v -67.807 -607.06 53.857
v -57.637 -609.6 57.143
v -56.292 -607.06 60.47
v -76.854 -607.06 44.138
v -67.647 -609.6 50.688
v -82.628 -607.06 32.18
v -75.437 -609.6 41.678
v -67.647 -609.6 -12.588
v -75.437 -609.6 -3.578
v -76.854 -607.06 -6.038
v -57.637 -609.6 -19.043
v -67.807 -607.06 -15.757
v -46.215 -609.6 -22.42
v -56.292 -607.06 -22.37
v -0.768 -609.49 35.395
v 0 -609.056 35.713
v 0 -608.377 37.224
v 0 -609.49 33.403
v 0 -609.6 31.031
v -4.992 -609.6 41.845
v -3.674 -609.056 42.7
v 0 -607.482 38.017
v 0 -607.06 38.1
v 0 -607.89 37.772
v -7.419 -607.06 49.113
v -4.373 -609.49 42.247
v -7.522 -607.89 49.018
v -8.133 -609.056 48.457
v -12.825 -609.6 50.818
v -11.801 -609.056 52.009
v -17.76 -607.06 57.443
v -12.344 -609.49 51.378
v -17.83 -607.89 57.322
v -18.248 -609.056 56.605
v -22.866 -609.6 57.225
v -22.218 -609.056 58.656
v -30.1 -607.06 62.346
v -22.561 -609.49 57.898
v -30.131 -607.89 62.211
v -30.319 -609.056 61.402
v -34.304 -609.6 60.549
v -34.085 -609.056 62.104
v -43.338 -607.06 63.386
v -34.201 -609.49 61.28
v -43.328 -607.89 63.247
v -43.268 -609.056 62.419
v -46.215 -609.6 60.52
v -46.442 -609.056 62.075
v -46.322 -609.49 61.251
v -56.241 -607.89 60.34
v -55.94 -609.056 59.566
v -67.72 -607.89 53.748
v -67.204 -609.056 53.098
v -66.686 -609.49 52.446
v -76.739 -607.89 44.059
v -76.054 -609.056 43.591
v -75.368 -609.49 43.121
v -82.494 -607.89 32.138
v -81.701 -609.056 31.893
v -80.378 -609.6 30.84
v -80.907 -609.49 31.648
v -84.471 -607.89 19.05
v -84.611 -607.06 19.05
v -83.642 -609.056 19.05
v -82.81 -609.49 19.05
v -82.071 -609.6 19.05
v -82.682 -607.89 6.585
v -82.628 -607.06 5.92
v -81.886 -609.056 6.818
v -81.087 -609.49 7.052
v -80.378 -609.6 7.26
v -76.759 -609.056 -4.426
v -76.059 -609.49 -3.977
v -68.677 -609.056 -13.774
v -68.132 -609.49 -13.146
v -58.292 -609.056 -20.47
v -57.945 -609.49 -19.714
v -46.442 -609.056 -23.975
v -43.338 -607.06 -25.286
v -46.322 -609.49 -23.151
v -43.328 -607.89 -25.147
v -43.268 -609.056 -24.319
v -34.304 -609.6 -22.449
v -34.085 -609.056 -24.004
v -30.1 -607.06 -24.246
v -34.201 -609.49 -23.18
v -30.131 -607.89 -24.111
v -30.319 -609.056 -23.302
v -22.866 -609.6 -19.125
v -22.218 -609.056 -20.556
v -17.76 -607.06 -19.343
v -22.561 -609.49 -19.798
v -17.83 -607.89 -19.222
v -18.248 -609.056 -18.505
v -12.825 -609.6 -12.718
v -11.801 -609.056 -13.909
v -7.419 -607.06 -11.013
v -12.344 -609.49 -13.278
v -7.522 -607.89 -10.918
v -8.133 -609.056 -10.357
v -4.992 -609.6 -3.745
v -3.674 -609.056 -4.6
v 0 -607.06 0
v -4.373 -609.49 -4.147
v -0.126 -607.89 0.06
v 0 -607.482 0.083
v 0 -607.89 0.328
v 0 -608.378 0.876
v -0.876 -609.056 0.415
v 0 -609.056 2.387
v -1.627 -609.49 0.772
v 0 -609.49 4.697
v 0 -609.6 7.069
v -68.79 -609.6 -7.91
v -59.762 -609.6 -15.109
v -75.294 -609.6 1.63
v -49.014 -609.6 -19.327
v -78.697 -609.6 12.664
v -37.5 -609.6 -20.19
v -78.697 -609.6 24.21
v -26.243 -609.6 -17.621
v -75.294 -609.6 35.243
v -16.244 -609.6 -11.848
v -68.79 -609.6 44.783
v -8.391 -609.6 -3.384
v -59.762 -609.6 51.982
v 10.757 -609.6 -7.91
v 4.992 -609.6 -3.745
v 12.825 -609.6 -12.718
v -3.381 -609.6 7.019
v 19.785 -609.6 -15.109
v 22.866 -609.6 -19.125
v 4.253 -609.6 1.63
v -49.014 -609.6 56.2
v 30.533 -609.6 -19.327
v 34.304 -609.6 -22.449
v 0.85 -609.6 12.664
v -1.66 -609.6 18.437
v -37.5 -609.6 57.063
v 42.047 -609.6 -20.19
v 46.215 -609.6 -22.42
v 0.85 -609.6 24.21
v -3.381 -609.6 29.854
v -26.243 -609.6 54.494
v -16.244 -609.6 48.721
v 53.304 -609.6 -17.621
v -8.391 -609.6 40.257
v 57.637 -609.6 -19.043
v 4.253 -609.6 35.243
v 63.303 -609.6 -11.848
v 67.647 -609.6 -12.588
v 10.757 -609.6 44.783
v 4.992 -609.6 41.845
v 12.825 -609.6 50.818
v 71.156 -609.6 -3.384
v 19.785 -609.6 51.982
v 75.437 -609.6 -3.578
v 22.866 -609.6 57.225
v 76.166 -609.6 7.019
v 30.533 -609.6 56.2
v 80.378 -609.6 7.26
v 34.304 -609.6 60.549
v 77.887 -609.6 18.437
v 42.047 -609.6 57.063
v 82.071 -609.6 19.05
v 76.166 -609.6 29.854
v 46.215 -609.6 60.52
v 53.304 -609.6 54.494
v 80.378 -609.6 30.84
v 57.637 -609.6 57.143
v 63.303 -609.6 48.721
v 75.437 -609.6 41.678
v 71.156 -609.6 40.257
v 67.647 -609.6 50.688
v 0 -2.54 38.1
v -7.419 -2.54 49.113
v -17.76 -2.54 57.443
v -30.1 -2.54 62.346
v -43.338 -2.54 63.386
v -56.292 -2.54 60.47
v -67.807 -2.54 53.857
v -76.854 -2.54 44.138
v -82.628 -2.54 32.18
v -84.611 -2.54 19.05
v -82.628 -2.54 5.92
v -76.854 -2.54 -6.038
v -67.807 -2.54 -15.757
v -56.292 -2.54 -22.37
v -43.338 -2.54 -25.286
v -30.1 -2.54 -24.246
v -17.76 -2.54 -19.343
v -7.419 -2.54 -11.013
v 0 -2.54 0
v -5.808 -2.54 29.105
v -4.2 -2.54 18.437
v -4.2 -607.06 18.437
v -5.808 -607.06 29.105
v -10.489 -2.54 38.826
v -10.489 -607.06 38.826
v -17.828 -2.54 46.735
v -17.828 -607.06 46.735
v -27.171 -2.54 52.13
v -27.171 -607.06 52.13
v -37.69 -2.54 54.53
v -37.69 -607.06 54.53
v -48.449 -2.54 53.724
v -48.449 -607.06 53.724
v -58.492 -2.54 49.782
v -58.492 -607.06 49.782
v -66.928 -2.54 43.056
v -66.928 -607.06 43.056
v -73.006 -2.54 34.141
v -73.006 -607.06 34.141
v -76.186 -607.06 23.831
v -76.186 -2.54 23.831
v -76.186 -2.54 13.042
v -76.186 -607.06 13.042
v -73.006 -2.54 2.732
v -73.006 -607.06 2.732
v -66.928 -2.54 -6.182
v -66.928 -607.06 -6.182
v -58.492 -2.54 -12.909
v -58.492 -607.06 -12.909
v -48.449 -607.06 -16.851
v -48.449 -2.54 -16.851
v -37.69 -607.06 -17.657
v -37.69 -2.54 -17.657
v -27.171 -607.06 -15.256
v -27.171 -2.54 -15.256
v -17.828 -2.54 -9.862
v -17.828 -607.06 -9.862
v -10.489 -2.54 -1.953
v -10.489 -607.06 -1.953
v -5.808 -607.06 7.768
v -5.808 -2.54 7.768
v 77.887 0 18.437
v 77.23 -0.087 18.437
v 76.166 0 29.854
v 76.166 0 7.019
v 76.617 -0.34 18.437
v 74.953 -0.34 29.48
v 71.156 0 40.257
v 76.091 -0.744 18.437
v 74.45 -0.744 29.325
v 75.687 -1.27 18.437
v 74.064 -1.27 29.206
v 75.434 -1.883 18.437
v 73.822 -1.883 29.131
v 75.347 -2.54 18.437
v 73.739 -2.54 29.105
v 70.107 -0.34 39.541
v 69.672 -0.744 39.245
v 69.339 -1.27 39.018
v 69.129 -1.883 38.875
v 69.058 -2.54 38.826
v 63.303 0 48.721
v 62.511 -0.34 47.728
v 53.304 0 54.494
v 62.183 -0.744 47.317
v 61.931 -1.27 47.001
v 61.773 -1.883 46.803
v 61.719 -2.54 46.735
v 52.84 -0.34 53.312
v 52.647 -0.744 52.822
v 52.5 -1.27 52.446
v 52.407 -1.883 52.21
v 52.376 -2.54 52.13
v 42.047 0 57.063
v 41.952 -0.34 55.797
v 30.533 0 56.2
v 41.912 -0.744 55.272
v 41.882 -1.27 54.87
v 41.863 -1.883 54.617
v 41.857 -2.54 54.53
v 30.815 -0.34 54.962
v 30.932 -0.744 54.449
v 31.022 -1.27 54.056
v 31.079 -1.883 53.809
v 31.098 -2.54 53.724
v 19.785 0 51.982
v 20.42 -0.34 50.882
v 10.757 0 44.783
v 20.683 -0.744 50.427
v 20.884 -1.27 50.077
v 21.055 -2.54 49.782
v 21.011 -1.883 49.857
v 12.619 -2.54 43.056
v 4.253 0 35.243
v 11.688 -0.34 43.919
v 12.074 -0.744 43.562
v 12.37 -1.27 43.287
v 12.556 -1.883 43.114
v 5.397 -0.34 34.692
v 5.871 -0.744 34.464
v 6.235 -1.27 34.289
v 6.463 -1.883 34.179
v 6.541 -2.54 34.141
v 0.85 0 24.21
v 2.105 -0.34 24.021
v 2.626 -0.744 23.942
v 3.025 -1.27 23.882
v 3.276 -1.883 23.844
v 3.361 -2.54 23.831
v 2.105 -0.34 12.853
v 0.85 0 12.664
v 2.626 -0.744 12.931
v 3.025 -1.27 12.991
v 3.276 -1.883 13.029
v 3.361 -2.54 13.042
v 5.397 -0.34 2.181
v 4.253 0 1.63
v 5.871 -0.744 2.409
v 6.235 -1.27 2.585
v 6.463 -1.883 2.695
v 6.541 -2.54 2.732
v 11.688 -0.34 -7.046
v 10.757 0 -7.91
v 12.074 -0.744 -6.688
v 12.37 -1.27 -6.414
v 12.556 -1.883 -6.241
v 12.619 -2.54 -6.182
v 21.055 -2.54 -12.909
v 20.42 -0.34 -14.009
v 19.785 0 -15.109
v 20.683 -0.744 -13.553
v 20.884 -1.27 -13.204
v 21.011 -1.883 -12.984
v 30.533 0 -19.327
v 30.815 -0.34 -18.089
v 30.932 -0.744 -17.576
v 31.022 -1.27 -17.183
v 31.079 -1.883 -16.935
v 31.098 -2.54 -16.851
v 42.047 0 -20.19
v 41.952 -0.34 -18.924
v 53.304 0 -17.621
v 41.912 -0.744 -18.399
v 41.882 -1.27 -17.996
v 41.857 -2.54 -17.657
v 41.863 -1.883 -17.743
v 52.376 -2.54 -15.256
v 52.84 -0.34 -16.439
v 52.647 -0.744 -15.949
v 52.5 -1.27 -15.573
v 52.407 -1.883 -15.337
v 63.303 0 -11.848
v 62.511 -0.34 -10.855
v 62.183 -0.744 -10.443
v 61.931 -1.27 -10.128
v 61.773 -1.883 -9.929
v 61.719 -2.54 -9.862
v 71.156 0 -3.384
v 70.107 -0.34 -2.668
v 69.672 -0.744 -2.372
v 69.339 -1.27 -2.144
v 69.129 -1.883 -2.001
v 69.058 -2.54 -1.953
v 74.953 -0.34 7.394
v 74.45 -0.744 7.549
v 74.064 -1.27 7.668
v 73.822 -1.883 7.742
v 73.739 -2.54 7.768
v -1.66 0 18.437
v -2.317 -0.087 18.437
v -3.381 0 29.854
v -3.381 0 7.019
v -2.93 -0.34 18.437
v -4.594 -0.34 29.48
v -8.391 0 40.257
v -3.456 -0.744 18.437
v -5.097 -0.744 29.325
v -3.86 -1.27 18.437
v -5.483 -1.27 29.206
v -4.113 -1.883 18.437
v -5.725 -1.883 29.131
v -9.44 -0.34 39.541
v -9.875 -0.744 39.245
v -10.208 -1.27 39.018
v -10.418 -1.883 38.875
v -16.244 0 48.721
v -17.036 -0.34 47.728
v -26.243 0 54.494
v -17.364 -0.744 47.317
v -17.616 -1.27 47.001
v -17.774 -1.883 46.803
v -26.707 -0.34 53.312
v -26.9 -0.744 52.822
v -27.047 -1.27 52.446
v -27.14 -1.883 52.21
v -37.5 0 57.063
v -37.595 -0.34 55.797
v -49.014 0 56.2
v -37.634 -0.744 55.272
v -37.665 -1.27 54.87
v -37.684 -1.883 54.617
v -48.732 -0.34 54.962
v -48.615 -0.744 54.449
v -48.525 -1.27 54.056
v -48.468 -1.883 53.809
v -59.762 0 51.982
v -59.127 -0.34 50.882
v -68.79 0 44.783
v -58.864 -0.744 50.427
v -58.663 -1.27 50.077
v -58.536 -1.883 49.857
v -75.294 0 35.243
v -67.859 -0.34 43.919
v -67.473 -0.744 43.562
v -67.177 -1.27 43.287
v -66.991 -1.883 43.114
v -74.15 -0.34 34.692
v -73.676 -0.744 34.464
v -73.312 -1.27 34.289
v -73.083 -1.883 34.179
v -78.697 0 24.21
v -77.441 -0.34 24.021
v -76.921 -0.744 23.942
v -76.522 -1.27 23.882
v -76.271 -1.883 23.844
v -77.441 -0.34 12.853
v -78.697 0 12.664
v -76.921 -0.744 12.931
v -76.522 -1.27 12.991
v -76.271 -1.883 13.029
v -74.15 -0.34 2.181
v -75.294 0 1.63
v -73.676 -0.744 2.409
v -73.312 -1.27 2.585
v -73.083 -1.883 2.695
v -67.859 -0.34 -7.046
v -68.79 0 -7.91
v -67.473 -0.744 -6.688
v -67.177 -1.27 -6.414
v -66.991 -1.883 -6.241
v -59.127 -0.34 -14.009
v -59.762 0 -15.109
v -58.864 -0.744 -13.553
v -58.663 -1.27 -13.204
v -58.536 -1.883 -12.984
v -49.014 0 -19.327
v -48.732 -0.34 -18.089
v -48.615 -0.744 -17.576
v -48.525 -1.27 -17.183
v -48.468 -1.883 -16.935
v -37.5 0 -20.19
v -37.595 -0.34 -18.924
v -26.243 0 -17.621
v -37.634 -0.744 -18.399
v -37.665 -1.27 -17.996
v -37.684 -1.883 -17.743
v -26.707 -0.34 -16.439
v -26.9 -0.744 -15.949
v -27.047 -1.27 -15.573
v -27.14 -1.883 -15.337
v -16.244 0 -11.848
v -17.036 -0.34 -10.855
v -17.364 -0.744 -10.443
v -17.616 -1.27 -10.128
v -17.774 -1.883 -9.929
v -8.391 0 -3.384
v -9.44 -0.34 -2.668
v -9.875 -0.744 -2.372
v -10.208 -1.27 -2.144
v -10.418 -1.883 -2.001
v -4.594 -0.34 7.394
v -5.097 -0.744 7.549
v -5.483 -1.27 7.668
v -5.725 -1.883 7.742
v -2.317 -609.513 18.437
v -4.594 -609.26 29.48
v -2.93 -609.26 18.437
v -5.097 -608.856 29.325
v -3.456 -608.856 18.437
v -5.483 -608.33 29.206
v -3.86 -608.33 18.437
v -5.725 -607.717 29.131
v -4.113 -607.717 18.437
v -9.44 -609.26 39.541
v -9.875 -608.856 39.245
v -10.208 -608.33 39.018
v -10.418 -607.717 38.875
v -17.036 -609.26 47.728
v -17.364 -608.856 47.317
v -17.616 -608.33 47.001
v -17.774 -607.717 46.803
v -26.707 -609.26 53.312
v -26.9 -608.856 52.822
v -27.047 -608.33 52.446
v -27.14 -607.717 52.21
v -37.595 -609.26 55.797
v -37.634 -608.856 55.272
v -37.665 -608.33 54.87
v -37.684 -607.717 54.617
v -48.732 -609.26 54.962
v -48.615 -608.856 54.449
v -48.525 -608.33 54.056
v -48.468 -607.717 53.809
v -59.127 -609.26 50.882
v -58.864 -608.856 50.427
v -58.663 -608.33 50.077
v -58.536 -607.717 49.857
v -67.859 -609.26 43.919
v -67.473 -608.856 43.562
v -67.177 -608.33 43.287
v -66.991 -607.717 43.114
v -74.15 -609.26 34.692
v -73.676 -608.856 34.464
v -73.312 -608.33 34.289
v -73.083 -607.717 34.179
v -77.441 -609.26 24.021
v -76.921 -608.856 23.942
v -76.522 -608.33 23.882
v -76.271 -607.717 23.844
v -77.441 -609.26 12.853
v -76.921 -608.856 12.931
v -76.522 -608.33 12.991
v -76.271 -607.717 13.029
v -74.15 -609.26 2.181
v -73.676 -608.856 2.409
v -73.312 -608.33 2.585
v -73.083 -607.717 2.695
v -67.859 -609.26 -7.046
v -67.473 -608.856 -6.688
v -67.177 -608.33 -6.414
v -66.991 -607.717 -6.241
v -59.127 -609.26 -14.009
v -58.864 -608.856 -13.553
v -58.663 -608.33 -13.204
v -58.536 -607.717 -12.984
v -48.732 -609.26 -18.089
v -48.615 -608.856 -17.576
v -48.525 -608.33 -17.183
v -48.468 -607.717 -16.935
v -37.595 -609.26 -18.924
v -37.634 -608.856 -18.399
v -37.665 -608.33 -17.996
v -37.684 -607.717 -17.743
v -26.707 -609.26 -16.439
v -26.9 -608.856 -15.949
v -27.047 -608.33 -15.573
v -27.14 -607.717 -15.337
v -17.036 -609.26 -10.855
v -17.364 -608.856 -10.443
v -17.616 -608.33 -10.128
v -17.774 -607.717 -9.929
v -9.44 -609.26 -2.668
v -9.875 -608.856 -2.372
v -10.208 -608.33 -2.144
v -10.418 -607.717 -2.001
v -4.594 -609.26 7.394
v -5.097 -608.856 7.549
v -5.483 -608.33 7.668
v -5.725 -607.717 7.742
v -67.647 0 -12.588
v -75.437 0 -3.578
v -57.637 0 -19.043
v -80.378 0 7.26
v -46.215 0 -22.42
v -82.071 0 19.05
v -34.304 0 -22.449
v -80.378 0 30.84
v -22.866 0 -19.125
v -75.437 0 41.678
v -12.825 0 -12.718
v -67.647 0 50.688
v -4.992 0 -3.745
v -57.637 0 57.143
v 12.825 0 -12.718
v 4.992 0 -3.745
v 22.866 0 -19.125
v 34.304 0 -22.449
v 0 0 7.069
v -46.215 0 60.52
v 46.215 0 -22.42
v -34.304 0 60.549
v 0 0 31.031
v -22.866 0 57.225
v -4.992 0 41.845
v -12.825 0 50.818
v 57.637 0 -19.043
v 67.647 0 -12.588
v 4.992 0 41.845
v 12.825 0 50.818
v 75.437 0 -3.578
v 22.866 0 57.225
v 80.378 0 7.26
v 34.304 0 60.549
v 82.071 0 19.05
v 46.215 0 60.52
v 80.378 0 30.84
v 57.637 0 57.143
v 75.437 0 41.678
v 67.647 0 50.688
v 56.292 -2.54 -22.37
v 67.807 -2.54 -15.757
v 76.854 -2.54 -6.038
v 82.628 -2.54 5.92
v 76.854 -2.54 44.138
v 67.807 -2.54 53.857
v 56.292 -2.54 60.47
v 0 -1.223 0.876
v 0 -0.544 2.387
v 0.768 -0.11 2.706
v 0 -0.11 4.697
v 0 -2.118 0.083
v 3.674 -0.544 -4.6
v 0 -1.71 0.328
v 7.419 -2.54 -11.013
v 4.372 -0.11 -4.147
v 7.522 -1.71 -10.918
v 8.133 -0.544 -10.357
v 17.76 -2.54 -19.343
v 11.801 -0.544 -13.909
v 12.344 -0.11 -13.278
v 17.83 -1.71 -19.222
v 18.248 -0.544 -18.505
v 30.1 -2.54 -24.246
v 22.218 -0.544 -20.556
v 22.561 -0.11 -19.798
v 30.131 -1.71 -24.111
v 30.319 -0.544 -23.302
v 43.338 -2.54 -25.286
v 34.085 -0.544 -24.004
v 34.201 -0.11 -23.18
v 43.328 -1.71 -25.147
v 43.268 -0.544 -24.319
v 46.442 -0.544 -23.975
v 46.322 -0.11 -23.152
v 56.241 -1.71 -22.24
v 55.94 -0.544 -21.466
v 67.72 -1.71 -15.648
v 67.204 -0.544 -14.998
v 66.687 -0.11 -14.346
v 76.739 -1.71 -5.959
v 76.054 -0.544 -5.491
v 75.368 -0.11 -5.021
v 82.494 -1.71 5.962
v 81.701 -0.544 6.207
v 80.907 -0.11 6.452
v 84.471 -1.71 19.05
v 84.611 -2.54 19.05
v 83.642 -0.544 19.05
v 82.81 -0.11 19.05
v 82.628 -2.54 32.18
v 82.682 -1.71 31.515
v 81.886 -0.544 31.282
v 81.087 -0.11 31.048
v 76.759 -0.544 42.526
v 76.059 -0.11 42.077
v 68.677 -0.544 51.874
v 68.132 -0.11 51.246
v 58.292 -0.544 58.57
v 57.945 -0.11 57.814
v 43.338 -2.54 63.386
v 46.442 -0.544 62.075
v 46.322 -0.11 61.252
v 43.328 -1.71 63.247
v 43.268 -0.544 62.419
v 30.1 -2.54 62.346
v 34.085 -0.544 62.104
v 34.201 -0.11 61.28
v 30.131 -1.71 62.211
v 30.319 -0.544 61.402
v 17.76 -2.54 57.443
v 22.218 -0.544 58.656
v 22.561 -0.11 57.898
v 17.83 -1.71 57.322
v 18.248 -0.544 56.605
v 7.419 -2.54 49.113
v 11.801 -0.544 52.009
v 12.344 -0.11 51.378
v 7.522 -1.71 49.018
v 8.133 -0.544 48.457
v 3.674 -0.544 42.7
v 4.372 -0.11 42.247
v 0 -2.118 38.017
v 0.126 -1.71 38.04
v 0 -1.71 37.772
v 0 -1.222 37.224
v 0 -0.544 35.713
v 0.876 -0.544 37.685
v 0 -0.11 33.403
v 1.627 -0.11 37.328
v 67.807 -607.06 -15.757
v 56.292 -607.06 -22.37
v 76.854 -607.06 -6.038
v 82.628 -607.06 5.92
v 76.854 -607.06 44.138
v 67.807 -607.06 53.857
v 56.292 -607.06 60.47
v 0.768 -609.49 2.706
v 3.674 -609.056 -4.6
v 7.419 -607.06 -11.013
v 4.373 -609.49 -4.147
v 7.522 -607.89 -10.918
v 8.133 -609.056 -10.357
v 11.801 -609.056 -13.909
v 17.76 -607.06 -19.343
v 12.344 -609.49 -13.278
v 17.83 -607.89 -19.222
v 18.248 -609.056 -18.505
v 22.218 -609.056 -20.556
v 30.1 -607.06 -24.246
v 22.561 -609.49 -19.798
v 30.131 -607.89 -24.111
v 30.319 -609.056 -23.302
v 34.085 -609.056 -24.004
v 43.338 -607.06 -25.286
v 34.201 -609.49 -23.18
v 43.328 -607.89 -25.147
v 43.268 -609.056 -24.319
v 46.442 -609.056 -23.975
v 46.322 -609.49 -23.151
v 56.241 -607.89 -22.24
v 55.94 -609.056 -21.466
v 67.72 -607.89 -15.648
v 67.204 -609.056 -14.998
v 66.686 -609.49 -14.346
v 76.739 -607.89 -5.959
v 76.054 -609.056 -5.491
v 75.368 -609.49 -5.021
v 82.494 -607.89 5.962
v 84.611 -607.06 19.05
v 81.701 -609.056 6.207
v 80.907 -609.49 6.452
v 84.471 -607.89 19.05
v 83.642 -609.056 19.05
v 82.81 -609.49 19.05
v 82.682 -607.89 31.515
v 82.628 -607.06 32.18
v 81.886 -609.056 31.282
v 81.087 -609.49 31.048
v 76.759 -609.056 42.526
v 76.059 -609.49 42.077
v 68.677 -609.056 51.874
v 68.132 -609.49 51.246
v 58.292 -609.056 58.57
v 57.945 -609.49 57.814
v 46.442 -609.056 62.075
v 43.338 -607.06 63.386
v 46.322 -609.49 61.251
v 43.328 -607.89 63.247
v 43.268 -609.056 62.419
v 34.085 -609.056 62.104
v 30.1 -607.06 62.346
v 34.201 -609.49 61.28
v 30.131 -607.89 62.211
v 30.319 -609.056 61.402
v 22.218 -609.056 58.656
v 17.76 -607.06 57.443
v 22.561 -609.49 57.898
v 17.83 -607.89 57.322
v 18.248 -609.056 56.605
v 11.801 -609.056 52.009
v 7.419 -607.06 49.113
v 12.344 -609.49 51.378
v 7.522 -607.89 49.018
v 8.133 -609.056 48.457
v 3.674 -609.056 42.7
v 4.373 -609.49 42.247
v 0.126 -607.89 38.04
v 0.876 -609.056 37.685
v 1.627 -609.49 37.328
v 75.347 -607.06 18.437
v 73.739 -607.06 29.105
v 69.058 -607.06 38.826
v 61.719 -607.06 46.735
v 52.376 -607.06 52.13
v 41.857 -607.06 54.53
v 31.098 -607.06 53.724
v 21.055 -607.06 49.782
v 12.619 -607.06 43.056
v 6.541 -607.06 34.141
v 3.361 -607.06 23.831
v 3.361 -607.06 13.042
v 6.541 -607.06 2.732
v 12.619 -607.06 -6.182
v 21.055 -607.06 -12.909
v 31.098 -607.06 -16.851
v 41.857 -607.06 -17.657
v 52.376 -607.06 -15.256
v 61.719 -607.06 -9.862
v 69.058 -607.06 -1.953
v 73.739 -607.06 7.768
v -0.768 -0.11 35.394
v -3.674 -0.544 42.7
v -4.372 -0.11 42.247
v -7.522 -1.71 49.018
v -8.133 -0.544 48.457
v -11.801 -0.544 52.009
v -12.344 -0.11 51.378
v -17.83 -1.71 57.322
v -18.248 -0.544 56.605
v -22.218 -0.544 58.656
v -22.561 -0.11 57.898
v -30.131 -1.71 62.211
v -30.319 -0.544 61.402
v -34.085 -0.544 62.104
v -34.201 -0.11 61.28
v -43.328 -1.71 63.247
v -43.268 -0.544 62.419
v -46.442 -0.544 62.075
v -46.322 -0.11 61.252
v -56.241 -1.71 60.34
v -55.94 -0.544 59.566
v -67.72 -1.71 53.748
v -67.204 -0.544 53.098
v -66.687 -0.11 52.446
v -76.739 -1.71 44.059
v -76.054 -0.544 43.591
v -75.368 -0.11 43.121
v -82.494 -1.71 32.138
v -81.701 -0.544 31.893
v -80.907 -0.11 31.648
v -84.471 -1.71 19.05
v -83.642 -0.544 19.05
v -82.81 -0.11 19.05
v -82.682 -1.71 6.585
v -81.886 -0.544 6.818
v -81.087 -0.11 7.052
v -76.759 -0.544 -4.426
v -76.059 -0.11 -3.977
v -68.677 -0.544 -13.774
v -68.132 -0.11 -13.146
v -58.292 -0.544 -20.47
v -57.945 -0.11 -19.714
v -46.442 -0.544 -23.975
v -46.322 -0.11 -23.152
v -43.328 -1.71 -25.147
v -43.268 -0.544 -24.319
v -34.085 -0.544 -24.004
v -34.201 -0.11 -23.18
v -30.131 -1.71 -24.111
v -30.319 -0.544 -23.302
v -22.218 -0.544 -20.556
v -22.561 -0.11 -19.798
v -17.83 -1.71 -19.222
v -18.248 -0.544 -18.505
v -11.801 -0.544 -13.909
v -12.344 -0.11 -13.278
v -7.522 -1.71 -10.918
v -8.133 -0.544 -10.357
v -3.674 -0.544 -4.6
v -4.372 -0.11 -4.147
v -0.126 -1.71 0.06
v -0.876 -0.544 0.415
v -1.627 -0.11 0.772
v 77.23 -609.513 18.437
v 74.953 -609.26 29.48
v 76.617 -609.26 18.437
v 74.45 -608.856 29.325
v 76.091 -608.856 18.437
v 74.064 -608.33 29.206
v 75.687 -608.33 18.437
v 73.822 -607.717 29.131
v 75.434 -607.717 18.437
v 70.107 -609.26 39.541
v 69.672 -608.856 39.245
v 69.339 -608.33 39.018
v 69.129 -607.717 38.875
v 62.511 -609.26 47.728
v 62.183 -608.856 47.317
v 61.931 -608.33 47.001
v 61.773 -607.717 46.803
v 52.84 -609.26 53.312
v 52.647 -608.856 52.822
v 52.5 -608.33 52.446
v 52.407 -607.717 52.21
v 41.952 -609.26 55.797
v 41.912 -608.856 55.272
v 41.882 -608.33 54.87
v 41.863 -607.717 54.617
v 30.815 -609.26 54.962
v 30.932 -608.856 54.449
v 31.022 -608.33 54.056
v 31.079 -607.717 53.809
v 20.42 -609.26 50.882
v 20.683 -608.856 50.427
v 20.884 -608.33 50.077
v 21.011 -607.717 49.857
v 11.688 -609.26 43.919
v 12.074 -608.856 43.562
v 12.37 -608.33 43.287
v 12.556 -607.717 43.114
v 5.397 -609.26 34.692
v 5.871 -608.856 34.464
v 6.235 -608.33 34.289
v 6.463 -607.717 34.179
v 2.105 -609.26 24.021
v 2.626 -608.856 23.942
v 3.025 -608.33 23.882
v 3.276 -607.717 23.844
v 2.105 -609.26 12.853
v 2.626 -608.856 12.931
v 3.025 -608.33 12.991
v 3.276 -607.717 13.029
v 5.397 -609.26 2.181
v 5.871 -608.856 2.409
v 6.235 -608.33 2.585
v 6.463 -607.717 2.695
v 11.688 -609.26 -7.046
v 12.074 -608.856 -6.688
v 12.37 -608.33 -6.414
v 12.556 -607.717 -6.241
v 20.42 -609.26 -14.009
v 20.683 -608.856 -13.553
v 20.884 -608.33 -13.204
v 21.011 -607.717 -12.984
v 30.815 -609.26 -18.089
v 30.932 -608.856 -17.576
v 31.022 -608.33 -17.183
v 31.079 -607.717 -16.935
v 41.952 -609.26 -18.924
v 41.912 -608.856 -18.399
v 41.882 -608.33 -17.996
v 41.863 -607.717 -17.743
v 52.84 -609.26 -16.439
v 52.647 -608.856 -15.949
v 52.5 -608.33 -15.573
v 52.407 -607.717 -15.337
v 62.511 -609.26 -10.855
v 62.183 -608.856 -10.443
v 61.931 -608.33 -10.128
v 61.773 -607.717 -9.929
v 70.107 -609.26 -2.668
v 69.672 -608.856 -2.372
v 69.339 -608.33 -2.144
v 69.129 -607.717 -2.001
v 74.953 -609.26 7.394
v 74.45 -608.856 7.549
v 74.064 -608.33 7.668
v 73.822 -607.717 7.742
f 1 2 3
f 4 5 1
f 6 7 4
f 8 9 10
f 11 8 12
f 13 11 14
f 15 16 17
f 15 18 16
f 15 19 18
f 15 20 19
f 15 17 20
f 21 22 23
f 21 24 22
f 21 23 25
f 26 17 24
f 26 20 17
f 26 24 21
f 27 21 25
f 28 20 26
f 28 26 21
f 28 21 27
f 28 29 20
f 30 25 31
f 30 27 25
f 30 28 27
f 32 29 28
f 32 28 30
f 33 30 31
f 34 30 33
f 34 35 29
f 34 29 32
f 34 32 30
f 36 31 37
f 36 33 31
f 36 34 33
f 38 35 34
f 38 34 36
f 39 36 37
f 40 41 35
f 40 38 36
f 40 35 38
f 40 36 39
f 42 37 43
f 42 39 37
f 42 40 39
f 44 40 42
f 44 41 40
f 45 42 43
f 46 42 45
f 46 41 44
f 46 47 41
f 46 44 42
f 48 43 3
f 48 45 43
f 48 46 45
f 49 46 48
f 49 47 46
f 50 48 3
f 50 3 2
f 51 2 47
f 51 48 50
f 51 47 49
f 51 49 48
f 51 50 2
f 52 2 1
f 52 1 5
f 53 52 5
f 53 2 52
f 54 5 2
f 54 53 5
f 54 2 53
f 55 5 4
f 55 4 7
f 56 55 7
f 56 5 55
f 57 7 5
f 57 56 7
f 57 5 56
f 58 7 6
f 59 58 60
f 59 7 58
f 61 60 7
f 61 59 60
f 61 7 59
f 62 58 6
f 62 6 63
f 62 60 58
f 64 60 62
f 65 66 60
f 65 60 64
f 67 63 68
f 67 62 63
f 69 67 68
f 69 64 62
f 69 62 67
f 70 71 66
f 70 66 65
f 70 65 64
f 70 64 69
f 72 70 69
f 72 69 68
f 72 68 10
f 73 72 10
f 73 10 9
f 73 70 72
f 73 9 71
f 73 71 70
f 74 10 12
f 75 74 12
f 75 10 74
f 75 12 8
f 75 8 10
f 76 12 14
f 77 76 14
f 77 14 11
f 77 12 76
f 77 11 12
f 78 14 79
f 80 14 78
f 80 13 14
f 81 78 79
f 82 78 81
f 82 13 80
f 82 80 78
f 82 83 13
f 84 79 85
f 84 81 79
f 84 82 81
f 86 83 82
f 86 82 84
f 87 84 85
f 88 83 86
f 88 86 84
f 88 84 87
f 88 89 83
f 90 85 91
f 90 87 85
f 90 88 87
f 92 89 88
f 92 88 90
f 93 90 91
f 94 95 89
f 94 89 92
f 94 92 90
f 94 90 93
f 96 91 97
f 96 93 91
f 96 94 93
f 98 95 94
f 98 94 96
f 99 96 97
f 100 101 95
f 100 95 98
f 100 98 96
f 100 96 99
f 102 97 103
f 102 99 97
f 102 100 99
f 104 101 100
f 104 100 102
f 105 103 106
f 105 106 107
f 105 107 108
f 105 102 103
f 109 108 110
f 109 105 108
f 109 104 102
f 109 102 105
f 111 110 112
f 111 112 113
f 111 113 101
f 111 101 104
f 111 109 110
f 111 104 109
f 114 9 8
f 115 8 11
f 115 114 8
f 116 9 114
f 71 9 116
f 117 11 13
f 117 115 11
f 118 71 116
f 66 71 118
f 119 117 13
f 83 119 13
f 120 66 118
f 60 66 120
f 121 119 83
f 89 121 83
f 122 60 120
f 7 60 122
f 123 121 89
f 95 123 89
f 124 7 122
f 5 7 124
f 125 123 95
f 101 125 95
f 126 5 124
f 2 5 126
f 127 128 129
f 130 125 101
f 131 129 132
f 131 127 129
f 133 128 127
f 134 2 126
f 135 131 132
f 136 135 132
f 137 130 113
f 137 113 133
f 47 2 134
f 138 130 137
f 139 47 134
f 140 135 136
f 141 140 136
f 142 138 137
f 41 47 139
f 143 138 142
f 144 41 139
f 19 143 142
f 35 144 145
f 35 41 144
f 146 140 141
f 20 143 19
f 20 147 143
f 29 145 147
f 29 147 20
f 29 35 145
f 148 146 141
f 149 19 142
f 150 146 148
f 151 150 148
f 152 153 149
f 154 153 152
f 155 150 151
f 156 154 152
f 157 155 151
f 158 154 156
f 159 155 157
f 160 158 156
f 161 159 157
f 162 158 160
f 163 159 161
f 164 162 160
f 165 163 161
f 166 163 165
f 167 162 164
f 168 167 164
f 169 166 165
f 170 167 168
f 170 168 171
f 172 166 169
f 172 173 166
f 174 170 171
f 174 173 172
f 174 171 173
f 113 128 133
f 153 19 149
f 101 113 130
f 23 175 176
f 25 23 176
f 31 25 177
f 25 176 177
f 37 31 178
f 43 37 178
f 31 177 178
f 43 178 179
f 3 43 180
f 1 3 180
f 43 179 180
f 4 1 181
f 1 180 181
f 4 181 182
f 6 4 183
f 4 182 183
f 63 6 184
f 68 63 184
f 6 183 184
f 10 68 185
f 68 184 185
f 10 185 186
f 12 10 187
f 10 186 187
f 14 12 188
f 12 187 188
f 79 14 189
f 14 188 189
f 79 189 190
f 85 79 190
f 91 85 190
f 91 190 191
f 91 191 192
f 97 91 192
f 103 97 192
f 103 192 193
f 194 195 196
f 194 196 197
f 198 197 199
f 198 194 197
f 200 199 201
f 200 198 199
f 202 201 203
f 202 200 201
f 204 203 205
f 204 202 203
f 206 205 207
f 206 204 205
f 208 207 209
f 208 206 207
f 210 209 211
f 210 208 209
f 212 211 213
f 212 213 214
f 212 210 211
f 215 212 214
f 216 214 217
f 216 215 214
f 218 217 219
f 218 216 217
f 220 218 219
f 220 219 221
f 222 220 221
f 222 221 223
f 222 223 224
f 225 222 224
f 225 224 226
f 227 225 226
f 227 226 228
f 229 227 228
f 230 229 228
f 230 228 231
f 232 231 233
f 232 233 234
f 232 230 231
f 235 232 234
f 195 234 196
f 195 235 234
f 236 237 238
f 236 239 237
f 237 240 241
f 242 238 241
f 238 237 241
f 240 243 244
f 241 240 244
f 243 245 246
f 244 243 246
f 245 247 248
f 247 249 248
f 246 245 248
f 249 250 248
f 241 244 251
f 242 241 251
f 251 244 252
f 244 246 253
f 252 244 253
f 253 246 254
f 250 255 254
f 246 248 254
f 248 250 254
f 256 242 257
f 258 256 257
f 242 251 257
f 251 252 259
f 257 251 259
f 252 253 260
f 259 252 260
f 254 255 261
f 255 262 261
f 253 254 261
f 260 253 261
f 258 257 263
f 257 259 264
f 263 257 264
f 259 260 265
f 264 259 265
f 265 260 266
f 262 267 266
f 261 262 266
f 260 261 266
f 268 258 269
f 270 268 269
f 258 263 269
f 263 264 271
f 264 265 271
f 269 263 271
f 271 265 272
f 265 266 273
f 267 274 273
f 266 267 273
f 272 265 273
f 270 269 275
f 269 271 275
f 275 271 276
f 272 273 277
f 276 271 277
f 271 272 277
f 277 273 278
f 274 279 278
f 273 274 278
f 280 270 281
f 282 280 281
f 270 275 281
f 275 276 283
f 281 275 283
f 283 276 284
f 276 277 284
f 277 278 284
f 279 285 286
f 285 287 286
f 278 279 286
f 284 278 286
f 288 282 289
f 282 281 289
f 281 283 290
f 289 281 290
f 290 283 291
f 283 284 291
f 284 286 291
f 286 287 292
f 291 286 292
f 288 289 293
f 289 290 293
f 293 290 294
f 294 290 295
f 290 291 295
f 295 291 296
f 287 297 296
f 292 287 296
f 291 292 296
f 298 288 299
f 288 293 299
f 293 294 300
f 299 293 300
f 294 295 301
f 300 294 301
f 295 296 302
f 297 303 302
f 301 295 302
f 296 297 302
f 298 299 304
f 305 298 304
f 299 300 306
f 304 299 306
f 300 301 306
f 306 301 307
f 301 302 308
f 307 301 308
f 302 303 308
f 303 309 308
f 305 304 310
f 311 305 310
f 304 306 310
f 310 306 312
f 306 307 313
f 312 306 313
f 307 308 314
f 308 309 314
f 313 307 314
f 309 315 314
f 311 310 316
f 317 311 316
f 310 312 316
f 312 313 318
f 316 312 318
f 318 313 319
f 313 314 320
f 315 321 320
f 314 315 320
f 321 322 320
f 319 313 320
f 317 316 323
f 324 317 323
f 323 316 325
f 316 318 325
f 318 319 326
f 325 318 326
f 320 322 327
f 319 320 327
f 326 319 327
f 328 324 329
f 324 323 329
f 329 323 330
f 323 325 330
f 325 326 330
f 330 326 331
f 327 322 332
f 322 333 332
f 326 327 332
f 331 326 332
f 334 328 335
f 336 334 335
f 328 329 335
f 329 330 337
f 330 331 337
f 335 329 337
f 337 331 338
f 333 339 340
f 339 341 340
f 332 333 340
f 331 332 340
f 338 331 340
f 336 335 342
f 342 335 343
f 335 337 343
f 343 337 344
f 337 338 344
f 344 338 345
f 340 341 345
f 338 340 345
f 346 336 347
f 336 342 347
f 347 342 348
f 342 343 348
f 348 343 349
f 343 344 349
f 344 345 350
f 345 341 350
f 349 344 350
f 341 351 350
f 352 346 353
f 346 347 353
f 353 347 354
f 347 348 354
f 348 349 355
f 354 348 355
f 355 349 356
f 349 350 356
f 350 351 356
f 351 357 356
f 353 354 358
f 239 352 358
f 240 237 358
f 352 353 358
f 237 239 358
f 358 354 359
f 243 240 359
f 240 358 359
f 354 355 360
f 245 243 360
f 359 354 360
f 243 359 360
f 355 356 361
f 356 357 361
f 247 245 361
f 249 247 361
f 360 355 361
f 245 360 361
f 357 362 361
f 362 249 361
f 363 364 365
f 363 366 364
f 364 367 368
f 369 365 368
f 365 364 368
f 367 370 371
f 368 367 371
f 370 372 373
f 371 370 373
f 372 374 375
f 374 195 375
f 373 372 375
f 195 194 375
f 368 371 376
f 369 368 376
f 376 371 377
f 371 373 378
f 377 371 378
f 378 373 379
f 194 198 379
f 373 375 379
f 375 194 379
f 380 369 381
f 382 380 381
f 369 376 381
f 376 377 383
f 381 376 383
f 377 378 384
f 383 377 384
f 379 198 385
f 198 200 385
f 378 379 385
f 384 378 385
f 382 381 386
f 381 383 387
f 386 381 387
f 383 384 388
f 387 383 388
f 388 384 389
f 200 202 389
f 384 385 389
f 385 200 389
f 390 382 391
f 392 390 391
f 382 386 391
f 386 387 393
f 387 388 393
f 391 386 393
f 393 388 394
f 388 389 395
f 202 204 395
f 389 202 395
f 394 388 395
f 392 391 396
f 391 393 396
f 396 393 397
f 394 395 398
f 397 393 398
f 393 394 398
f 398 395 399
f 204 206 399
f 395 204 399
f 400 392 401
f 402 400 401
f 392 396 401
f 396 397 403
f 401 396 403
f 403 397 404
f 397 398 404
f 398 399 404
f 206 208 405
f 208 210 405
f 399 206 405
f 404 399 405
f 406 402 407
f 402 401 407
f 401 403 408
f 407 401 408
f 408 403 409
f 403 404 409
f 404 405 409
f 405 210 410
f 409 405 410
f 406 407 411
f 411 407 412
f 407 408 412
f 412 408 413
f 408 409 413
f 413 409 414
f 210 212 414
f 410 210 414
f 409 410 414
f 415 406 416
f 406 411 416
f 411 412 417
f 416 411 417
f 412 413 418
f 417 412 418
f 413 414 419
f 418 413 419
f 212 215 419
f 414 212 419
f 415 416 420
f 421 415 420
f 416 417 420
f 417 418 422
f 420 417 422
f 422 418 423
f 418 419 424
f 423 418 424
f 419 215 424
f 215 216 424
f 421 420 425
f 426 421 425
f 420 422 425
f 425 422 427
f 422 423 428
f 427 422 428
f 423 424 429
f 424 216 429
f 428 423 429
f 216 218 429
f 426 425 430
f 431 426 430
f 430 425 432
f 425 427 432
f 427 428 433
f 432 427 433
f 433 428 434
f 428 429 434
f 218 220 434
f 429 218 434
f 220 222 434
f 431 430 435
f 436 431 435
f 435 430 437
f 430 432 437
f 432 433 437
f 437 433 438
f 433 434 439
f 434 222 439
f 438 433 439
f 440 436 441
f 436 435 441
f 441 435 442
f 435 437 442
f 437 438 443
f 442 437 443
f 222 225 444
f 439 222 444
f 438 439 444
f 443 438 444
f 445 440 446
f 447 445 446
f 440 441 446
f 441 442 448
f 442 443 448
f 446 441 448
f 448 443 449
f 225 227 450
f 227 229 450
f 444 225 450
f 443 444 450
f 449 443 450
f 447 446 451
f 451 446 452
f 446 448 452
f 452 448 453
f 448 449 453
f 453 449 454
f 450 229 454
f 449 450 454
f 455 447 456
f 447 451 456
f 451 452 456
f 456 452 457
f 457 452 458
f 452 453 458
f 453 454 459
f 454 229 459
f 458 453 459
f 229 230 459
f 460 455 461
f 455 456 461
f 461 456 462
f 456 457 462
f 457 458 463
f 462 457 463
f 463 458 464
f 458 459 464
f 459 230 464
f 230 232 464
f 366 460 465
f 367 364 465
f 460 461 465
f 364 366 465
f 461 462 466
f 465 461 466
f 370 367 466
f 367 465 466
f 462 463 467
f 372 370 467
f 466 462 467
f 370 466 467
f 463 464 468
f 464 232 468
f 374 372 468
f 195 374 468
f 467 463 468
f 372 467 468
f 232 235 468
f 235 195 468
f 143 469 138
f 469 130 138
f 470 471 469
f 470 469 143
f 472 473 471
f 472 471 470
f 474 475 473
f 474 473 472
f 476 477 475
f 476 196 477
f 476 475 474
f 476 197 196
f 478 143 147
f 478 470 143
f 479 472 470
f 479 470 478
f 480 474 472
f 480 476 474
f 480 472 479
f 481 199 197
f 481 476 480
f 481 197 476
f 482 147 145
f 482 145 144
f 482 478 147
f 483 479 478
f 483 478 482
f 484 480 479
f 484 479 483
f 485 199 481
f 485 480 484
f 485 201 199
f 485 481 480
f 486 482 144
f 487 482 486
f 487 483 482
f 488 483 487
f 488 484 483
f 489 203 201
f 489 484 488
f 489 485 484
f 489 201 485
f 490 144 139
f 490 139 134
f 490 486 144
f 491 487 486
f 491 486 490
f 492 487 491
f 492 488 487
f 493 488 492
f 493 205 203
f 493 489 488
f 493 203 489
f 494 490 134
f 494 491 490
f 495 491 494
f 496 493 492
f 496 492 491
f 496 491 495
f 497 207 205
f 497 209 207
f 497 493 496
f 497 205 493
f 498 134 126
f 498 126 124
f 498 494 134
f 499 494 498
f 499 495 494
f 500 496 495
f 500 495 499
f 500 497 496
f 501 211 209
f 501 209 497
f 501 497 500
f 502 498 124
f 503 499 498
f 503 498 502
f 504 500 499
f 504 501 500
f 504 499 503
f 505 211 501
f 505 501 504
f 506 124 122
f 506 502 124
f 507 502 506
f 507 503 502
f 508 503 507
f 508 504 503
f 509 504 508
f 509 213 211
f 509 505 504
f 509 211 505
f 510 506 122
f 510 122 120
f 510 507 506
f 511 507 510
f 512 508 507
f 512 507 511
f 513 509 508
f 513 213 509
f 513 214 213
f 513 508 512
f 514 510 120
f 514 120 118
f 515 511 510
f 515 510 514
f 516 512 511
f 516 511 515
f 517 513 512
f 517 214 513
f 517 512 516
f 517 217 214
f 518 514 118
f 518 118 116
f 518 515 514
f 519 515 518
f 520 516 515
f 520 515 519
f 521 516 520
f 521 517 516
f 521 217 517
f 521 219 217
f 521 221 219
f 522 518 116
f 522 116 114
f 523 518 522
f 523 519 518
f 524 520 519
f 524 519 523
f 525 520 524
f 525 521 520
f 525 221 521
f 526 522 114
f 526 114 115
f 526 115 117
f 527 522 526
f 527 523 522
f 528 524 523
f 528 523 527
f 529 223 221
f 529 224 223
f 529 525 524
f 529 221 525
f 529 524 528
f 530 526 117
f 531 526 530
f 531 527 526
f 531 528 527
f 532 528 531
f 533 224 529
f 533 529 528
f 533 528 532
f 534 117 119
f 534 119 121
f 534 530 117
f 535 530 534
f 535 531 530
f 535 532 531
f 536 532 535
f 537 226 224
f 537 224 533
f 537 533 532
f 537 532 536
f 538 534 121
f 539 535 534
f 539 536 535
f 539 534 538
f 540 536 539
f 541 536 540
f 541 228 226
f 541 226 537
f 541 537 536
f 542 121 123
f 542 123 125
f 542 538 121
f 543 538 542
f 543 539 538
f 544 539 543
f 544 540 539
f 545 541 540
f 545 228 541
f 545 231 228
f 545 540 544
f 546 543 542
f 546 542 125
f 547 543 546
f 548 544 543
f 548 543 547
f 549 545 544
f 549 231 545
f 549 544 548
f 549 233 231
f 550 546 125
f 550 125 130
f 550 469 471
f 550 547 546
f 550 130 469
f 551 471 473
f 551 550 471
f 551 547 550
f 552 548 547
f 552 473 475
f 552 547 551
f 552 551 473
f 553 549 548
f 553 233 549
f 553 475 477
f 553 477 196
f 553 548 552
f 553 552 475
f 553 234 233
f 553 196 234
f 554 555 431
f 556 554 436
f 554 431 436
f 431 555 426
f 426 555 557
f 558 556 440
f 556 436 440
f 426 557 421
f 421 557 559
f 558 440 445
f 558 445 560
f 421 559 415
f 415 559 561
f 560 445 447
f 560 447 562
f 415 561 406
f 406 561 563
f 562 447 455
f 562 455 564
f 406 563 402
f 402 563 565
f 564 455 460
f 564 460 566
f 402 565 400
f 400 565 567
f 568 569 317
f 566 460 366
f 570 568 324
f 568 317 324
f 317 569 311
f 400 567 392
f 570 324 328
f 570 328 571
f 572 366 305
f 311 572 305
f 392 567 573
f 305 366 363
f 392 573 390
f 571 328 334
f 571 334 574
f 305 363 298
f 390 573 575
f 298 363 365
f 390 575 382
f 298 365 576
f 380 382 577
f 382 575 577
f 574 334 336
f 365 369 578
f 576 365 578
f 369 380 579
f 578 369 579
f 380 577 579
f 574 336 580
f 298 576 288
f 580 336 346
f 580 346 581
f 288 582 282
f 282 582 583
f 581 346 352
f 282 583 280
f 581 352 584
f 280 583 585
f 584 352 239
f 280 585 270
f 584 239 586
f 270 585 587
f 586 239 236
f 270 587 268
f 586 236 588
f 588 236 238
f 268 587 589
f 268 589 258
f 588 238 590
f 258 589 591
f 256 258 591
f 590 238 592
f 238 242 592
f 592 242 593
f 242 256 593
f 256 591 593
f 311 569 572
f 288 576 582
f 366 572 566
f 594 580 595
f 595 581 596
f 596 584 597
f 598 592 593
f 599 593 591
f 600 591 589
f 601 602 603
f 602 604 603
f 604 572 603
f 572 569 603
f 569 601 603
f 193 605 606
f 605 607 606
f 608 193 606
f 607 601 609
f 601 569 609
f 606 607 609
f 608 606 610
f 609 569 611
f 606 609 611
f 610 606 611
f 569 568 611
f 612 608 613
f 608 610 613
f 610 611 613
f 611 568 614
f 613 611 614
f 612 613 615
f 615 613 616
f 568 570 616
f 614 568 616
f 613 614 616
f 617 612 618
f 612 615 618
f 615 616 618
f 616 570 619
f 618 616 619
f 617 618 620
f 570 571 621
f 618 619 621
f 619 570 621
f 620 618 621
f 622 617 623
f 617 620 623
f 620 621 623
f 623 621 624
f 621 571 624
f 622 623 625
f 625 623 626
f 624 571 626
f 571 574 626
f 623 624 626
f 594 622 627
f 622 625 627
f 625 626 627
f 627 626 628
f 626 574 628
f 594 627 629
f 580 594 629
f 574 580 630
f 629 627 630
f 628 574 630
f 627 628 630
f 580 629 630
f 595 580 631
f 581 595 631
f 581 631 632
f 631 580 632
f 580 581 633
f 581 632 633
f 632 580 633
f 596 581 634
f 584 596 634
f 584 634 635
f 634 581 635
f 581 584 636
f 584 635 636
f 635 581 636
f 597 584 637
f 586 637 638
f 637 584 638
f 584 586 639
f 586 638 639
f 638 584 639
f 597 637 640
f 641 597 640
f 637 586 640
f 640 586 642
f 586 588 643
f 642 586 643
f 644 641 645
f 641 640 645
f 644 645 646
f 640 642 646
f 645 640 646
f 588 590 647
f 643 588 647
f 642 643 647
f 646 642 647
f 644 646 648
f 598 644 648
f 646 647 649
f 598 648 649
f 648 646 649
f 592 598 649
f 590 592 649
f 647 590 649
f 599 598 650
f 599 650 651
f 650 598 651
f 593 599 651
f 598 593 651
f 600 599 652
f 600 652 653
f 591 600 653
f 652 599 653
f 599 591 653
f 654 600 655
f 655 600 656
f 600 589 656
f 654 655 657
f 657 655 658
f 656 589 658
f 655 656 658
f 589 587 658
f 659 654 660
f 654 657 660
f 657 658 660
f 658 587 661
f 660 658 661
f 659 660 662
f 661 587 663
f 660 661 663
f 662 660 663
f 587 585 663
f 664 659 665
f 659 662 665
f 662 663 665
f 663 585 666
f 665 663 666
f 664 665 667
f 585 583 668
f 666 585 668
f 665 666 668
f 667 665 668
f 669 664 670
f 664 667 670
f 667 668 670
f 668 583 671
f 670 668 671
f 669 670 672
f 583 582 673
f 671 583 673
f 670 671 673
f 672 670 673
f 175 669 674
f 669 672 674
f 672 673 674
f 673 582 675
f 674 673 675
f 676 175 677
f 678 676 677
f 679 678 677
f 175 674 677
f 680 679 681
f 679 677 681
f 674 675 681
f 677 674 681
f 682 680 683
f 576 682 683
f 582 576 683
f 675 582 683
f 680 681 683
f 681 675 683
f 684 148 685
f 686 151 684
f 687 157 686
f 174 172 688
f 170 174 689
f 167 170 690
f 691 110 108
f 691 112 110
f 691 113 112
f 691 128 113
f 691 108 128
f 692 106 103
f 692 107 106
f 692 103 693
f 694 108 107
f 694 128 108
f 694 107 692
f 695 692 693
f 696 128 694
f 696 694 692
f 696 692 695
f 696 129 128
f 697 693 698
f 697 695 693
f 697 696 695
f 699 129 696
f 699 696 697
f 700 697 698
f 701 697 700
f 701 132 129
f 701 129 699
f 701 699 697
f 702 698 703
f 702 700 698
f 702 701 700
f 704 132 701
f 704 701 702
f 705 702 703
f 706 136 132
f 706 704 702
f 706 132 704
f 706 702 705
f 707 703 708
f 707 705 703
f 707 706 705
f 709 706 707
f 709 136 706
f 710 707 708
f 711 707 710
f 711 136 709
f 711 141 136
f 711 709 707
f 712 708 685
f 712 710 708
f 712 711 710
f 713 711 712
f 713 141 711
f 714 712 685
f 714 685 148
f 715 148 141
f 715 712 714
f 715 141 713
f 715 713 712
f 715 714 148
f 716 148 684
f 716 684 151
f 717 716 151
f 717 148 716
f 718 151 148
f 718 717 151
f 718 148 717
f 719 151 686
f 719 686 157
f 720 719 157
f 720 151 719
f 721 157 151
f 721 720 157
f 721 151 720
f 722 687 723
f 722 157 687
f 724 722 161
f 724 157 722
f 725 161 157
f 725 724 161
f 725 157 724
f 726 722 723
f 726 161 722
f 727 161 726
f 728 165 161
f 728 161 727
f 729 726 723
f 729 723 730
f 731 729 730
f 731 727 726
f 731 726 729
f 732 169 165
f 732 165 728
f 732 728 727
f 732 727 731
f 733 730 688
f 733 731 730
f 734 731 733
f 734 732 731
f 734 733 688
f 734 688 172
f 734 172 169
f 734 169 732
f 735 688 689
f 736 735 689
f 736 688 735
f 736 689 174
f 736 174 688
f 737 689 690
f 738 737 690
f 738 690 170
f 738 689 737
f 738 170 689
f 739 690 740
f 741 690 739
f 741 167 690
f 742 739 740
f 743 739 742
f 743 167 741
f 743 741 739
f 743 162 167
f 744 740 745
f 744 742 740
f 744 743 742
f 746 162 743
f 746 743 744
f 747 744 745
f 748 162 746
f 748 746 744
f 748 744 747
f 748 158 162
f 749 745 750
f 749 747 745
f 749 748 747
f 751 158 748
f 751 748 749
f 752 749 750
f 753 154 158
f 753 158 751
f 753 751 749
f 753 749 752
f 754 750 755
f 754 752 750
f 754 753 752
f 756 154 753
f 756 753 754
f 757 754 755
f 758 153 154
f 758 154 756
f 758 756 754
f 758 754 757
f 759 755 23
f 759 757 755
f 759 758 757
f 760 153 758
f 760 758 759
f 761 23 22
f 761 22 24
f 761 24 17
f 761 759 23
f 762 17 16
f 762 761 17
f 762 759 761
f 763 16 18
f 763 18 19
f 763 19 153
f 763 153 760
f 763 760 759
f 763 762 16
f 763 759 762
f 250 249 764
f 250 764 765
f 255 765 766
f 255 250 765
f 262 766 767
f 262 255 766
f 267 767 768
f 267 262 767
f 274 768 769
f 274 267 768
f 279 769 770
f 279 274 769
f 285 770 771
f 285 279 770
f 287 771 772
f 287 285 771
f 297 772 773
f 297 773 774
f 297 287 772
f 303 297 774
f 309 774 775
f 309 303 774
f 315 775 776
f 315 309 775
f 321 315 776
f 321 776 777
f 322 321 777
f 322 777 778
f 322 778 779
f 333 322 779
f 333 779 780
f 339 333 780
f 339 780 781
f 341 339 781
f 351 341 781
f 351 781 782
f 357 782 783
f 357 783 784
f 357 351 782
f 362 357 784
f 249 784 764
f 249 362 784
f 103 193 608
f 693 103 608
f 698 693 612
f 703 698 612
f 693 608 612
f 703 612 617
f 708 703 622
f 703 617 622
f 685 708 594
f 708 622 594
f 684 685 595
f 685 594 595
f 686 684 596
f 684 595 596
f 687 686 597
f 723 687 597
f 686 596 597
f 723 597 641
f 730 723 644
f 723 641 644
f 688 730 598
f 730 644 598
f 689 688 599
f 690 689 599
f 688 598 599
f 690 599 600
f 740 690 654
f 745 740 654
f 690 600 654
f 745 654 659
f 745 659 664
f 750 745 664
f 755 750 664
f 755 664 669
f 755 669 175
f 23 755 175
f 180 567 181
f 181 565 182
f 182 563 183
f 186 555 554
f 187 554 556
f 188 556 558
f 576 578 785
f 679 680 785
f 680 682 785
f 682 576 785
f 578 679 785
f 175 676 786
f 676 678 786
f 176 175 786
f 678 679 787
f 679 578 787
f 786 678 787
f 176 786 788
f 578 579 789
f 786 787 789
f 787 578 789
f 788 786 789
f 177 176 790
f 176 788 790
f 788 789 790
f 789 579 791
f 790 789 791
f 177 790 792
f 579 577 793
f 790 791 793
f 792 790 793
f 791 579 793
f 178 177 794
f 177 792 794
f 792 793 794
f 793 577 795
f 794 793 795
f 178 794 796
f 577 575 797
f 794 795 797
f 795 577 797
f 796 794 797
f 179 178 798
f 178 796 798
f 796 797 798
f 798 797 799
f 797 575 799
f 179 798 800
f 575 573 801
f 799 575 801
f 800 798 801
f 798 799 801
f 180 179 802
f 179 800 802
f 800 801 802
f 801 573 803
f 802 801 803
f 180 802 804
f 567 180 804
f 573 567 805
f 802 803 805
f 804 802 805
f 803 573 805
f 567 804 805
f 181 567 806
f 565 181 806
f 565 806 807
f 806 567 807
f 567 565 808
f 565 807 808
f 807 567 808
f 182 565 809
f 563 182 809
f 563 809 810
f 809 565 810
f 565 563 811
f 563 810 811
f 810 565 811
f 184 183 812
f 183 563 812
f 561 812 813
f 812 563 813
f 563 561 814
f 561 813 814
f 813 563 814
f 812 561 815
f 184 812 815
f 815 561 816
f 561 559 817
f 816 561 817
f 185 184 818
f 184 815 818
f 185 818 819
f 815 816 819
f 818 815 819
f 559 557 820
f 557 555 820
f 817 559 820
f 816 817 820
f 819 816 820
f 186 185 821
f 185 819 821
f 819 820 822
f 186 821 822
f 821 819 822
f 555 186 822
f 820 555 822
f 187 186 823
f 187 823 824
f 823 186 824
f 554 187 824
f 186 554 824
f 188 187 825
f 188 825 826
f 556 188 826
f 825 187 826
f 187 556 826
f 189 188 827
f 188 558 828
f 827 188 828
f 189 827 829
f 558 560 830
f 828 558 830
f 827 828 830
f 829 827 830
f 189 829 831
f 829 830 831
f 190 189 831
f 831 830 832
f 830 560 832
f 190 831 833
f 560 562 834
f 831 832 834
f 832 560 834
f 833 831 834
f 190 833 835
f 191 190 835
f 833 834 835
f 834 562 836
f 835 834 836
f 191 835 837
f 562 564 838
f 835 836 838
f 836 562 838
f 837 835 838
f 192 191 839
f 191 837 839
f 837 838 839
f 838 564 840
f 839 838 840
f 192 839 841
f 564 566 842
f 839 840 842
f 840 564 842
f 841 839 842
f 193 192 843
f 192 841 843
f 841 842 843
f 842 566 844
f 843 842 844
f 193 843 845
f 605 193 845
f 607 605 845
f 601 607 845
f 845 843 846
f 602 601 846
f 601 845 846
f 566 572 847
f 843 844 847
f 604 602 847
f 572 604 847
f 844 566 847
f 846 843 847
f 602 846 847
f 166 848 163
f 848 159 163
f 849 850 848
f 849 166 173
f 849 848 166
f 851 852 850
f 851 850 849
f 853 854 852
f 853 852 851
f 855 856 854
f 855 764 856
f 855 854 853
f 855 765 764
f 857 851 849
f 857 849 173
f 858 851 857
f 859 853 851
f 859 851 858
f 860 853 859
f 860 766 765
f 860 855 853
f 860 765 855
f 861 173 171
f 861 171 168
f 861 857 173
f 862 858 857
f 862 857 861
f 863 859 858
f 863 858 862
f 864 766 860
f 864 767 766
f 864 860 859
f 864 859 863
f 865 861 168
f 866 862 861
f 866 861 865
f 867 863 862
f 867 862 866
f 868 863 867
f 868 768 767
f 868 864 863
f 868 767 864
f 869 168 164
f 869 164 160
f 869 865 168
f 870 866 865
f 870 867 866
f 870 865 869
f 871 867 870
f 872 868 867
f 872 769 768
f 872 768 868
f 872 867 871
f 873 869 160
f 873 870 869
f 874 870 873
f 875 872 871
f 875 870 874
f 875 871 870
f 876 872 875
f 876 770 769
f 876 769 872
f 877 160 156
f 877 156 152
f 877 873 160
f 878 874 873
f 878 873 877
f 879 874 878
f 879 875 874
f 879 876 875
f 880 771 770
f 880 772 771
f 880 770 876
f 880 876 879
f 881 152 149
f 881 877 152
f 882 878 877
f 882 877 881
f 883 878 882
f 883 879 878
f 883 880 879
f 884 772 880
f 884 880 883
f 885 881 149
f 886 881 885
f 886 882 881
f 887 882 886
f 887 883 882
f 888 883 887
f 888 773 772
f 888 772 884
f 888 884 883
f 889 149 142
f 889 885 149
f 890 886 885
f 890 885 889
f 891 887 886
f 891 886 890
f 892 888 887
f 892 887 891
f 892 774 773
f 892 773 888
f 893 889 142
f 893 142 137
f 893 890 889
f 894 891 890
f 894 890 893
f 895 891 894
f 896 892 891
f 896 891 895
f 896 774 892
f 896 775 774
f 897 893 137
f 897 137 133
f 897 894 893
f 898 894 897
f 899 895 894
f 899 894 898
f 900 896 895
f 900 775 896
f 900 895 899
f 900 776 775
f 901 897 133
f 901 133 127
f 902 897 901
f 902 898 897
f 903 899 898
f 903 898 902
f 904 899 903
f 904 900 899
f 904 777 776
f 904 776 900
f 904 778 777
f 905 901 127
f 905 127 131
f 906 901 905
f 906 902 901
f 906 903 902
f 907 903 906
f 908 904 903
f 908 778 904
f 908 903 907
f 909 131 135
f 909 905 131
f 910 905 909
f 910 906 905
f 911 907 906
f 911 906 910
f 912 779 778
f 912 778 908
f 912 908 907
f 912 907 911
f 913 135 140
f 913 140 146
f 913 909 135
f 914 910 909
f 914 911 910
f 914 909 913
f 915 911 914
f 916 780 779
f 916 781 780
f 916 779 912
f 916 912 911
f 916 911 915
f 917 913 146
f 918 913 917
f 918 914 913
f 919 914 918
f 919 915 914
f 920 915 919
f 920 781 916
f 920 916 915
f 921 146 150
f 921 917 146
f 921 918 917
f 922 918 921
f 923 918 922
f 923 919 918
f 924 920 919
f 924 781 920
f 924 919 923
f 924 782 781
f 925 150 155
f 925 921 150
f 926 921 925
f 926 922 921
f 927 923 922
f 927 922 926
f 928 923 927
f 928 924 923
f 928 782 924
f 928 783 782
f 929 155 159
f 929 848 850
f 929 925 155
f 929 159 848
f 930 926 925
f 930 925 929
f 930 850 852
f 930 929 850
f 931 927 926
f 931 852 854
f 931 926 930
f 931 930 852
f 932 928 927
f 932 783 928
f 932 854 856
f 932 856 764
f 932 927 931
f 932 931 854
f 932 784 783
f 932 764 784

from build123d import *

# Parameters (mm, degrees)
F1_DEPTH = 609.6
F2_R     = 36.195
F3_DEPTH = 609.6
F4_R     = 2.54


with BuildPart() as f1:
    # F0 (on Front) → F1 (new body)
    with BuildSketch(Plane.XZ):
        with BuildLine():
            ThreePointArc((0, 0), (84.610926, 19.05), (0, 38.1))
            ThreePointArc((0, 38.1), (-84.610926, 19.05), (0, 0))
        make_face()
    extrude(amount=F1_DEPTH)

    # F2 (on Front) → F3 (cut)
    with BuildSketch(Plane.XZ):
        with Locations((-40.394932, 18.436662)):
            Circle(F2_R)
        with Locations((39.152017, 18.436662)):
            Circle(F2_R)
    extrude(amount=F3_DEPTH, mode=Mode.SUBTRACT)

    # F4
    f4_edges = [f1.edges().sort_by_distance(p)[0] for p in [
        (-76.589932, -609.6, 18.436662),
        (2.957017, -609.6, 18.436662),
        (2.957017, 0, 18.436662),
        (-76.589932, 0, 18.436662),
        (84.610926, 0, 19.05),
        (-84.610926, 0, 19.05),
        (84.610926, -609.6, 19.05),
        (-84.610926, -609.6, 19.05),
    ]]
    fillet(f4_edges, radius=F4_R)


solid = f1.part
